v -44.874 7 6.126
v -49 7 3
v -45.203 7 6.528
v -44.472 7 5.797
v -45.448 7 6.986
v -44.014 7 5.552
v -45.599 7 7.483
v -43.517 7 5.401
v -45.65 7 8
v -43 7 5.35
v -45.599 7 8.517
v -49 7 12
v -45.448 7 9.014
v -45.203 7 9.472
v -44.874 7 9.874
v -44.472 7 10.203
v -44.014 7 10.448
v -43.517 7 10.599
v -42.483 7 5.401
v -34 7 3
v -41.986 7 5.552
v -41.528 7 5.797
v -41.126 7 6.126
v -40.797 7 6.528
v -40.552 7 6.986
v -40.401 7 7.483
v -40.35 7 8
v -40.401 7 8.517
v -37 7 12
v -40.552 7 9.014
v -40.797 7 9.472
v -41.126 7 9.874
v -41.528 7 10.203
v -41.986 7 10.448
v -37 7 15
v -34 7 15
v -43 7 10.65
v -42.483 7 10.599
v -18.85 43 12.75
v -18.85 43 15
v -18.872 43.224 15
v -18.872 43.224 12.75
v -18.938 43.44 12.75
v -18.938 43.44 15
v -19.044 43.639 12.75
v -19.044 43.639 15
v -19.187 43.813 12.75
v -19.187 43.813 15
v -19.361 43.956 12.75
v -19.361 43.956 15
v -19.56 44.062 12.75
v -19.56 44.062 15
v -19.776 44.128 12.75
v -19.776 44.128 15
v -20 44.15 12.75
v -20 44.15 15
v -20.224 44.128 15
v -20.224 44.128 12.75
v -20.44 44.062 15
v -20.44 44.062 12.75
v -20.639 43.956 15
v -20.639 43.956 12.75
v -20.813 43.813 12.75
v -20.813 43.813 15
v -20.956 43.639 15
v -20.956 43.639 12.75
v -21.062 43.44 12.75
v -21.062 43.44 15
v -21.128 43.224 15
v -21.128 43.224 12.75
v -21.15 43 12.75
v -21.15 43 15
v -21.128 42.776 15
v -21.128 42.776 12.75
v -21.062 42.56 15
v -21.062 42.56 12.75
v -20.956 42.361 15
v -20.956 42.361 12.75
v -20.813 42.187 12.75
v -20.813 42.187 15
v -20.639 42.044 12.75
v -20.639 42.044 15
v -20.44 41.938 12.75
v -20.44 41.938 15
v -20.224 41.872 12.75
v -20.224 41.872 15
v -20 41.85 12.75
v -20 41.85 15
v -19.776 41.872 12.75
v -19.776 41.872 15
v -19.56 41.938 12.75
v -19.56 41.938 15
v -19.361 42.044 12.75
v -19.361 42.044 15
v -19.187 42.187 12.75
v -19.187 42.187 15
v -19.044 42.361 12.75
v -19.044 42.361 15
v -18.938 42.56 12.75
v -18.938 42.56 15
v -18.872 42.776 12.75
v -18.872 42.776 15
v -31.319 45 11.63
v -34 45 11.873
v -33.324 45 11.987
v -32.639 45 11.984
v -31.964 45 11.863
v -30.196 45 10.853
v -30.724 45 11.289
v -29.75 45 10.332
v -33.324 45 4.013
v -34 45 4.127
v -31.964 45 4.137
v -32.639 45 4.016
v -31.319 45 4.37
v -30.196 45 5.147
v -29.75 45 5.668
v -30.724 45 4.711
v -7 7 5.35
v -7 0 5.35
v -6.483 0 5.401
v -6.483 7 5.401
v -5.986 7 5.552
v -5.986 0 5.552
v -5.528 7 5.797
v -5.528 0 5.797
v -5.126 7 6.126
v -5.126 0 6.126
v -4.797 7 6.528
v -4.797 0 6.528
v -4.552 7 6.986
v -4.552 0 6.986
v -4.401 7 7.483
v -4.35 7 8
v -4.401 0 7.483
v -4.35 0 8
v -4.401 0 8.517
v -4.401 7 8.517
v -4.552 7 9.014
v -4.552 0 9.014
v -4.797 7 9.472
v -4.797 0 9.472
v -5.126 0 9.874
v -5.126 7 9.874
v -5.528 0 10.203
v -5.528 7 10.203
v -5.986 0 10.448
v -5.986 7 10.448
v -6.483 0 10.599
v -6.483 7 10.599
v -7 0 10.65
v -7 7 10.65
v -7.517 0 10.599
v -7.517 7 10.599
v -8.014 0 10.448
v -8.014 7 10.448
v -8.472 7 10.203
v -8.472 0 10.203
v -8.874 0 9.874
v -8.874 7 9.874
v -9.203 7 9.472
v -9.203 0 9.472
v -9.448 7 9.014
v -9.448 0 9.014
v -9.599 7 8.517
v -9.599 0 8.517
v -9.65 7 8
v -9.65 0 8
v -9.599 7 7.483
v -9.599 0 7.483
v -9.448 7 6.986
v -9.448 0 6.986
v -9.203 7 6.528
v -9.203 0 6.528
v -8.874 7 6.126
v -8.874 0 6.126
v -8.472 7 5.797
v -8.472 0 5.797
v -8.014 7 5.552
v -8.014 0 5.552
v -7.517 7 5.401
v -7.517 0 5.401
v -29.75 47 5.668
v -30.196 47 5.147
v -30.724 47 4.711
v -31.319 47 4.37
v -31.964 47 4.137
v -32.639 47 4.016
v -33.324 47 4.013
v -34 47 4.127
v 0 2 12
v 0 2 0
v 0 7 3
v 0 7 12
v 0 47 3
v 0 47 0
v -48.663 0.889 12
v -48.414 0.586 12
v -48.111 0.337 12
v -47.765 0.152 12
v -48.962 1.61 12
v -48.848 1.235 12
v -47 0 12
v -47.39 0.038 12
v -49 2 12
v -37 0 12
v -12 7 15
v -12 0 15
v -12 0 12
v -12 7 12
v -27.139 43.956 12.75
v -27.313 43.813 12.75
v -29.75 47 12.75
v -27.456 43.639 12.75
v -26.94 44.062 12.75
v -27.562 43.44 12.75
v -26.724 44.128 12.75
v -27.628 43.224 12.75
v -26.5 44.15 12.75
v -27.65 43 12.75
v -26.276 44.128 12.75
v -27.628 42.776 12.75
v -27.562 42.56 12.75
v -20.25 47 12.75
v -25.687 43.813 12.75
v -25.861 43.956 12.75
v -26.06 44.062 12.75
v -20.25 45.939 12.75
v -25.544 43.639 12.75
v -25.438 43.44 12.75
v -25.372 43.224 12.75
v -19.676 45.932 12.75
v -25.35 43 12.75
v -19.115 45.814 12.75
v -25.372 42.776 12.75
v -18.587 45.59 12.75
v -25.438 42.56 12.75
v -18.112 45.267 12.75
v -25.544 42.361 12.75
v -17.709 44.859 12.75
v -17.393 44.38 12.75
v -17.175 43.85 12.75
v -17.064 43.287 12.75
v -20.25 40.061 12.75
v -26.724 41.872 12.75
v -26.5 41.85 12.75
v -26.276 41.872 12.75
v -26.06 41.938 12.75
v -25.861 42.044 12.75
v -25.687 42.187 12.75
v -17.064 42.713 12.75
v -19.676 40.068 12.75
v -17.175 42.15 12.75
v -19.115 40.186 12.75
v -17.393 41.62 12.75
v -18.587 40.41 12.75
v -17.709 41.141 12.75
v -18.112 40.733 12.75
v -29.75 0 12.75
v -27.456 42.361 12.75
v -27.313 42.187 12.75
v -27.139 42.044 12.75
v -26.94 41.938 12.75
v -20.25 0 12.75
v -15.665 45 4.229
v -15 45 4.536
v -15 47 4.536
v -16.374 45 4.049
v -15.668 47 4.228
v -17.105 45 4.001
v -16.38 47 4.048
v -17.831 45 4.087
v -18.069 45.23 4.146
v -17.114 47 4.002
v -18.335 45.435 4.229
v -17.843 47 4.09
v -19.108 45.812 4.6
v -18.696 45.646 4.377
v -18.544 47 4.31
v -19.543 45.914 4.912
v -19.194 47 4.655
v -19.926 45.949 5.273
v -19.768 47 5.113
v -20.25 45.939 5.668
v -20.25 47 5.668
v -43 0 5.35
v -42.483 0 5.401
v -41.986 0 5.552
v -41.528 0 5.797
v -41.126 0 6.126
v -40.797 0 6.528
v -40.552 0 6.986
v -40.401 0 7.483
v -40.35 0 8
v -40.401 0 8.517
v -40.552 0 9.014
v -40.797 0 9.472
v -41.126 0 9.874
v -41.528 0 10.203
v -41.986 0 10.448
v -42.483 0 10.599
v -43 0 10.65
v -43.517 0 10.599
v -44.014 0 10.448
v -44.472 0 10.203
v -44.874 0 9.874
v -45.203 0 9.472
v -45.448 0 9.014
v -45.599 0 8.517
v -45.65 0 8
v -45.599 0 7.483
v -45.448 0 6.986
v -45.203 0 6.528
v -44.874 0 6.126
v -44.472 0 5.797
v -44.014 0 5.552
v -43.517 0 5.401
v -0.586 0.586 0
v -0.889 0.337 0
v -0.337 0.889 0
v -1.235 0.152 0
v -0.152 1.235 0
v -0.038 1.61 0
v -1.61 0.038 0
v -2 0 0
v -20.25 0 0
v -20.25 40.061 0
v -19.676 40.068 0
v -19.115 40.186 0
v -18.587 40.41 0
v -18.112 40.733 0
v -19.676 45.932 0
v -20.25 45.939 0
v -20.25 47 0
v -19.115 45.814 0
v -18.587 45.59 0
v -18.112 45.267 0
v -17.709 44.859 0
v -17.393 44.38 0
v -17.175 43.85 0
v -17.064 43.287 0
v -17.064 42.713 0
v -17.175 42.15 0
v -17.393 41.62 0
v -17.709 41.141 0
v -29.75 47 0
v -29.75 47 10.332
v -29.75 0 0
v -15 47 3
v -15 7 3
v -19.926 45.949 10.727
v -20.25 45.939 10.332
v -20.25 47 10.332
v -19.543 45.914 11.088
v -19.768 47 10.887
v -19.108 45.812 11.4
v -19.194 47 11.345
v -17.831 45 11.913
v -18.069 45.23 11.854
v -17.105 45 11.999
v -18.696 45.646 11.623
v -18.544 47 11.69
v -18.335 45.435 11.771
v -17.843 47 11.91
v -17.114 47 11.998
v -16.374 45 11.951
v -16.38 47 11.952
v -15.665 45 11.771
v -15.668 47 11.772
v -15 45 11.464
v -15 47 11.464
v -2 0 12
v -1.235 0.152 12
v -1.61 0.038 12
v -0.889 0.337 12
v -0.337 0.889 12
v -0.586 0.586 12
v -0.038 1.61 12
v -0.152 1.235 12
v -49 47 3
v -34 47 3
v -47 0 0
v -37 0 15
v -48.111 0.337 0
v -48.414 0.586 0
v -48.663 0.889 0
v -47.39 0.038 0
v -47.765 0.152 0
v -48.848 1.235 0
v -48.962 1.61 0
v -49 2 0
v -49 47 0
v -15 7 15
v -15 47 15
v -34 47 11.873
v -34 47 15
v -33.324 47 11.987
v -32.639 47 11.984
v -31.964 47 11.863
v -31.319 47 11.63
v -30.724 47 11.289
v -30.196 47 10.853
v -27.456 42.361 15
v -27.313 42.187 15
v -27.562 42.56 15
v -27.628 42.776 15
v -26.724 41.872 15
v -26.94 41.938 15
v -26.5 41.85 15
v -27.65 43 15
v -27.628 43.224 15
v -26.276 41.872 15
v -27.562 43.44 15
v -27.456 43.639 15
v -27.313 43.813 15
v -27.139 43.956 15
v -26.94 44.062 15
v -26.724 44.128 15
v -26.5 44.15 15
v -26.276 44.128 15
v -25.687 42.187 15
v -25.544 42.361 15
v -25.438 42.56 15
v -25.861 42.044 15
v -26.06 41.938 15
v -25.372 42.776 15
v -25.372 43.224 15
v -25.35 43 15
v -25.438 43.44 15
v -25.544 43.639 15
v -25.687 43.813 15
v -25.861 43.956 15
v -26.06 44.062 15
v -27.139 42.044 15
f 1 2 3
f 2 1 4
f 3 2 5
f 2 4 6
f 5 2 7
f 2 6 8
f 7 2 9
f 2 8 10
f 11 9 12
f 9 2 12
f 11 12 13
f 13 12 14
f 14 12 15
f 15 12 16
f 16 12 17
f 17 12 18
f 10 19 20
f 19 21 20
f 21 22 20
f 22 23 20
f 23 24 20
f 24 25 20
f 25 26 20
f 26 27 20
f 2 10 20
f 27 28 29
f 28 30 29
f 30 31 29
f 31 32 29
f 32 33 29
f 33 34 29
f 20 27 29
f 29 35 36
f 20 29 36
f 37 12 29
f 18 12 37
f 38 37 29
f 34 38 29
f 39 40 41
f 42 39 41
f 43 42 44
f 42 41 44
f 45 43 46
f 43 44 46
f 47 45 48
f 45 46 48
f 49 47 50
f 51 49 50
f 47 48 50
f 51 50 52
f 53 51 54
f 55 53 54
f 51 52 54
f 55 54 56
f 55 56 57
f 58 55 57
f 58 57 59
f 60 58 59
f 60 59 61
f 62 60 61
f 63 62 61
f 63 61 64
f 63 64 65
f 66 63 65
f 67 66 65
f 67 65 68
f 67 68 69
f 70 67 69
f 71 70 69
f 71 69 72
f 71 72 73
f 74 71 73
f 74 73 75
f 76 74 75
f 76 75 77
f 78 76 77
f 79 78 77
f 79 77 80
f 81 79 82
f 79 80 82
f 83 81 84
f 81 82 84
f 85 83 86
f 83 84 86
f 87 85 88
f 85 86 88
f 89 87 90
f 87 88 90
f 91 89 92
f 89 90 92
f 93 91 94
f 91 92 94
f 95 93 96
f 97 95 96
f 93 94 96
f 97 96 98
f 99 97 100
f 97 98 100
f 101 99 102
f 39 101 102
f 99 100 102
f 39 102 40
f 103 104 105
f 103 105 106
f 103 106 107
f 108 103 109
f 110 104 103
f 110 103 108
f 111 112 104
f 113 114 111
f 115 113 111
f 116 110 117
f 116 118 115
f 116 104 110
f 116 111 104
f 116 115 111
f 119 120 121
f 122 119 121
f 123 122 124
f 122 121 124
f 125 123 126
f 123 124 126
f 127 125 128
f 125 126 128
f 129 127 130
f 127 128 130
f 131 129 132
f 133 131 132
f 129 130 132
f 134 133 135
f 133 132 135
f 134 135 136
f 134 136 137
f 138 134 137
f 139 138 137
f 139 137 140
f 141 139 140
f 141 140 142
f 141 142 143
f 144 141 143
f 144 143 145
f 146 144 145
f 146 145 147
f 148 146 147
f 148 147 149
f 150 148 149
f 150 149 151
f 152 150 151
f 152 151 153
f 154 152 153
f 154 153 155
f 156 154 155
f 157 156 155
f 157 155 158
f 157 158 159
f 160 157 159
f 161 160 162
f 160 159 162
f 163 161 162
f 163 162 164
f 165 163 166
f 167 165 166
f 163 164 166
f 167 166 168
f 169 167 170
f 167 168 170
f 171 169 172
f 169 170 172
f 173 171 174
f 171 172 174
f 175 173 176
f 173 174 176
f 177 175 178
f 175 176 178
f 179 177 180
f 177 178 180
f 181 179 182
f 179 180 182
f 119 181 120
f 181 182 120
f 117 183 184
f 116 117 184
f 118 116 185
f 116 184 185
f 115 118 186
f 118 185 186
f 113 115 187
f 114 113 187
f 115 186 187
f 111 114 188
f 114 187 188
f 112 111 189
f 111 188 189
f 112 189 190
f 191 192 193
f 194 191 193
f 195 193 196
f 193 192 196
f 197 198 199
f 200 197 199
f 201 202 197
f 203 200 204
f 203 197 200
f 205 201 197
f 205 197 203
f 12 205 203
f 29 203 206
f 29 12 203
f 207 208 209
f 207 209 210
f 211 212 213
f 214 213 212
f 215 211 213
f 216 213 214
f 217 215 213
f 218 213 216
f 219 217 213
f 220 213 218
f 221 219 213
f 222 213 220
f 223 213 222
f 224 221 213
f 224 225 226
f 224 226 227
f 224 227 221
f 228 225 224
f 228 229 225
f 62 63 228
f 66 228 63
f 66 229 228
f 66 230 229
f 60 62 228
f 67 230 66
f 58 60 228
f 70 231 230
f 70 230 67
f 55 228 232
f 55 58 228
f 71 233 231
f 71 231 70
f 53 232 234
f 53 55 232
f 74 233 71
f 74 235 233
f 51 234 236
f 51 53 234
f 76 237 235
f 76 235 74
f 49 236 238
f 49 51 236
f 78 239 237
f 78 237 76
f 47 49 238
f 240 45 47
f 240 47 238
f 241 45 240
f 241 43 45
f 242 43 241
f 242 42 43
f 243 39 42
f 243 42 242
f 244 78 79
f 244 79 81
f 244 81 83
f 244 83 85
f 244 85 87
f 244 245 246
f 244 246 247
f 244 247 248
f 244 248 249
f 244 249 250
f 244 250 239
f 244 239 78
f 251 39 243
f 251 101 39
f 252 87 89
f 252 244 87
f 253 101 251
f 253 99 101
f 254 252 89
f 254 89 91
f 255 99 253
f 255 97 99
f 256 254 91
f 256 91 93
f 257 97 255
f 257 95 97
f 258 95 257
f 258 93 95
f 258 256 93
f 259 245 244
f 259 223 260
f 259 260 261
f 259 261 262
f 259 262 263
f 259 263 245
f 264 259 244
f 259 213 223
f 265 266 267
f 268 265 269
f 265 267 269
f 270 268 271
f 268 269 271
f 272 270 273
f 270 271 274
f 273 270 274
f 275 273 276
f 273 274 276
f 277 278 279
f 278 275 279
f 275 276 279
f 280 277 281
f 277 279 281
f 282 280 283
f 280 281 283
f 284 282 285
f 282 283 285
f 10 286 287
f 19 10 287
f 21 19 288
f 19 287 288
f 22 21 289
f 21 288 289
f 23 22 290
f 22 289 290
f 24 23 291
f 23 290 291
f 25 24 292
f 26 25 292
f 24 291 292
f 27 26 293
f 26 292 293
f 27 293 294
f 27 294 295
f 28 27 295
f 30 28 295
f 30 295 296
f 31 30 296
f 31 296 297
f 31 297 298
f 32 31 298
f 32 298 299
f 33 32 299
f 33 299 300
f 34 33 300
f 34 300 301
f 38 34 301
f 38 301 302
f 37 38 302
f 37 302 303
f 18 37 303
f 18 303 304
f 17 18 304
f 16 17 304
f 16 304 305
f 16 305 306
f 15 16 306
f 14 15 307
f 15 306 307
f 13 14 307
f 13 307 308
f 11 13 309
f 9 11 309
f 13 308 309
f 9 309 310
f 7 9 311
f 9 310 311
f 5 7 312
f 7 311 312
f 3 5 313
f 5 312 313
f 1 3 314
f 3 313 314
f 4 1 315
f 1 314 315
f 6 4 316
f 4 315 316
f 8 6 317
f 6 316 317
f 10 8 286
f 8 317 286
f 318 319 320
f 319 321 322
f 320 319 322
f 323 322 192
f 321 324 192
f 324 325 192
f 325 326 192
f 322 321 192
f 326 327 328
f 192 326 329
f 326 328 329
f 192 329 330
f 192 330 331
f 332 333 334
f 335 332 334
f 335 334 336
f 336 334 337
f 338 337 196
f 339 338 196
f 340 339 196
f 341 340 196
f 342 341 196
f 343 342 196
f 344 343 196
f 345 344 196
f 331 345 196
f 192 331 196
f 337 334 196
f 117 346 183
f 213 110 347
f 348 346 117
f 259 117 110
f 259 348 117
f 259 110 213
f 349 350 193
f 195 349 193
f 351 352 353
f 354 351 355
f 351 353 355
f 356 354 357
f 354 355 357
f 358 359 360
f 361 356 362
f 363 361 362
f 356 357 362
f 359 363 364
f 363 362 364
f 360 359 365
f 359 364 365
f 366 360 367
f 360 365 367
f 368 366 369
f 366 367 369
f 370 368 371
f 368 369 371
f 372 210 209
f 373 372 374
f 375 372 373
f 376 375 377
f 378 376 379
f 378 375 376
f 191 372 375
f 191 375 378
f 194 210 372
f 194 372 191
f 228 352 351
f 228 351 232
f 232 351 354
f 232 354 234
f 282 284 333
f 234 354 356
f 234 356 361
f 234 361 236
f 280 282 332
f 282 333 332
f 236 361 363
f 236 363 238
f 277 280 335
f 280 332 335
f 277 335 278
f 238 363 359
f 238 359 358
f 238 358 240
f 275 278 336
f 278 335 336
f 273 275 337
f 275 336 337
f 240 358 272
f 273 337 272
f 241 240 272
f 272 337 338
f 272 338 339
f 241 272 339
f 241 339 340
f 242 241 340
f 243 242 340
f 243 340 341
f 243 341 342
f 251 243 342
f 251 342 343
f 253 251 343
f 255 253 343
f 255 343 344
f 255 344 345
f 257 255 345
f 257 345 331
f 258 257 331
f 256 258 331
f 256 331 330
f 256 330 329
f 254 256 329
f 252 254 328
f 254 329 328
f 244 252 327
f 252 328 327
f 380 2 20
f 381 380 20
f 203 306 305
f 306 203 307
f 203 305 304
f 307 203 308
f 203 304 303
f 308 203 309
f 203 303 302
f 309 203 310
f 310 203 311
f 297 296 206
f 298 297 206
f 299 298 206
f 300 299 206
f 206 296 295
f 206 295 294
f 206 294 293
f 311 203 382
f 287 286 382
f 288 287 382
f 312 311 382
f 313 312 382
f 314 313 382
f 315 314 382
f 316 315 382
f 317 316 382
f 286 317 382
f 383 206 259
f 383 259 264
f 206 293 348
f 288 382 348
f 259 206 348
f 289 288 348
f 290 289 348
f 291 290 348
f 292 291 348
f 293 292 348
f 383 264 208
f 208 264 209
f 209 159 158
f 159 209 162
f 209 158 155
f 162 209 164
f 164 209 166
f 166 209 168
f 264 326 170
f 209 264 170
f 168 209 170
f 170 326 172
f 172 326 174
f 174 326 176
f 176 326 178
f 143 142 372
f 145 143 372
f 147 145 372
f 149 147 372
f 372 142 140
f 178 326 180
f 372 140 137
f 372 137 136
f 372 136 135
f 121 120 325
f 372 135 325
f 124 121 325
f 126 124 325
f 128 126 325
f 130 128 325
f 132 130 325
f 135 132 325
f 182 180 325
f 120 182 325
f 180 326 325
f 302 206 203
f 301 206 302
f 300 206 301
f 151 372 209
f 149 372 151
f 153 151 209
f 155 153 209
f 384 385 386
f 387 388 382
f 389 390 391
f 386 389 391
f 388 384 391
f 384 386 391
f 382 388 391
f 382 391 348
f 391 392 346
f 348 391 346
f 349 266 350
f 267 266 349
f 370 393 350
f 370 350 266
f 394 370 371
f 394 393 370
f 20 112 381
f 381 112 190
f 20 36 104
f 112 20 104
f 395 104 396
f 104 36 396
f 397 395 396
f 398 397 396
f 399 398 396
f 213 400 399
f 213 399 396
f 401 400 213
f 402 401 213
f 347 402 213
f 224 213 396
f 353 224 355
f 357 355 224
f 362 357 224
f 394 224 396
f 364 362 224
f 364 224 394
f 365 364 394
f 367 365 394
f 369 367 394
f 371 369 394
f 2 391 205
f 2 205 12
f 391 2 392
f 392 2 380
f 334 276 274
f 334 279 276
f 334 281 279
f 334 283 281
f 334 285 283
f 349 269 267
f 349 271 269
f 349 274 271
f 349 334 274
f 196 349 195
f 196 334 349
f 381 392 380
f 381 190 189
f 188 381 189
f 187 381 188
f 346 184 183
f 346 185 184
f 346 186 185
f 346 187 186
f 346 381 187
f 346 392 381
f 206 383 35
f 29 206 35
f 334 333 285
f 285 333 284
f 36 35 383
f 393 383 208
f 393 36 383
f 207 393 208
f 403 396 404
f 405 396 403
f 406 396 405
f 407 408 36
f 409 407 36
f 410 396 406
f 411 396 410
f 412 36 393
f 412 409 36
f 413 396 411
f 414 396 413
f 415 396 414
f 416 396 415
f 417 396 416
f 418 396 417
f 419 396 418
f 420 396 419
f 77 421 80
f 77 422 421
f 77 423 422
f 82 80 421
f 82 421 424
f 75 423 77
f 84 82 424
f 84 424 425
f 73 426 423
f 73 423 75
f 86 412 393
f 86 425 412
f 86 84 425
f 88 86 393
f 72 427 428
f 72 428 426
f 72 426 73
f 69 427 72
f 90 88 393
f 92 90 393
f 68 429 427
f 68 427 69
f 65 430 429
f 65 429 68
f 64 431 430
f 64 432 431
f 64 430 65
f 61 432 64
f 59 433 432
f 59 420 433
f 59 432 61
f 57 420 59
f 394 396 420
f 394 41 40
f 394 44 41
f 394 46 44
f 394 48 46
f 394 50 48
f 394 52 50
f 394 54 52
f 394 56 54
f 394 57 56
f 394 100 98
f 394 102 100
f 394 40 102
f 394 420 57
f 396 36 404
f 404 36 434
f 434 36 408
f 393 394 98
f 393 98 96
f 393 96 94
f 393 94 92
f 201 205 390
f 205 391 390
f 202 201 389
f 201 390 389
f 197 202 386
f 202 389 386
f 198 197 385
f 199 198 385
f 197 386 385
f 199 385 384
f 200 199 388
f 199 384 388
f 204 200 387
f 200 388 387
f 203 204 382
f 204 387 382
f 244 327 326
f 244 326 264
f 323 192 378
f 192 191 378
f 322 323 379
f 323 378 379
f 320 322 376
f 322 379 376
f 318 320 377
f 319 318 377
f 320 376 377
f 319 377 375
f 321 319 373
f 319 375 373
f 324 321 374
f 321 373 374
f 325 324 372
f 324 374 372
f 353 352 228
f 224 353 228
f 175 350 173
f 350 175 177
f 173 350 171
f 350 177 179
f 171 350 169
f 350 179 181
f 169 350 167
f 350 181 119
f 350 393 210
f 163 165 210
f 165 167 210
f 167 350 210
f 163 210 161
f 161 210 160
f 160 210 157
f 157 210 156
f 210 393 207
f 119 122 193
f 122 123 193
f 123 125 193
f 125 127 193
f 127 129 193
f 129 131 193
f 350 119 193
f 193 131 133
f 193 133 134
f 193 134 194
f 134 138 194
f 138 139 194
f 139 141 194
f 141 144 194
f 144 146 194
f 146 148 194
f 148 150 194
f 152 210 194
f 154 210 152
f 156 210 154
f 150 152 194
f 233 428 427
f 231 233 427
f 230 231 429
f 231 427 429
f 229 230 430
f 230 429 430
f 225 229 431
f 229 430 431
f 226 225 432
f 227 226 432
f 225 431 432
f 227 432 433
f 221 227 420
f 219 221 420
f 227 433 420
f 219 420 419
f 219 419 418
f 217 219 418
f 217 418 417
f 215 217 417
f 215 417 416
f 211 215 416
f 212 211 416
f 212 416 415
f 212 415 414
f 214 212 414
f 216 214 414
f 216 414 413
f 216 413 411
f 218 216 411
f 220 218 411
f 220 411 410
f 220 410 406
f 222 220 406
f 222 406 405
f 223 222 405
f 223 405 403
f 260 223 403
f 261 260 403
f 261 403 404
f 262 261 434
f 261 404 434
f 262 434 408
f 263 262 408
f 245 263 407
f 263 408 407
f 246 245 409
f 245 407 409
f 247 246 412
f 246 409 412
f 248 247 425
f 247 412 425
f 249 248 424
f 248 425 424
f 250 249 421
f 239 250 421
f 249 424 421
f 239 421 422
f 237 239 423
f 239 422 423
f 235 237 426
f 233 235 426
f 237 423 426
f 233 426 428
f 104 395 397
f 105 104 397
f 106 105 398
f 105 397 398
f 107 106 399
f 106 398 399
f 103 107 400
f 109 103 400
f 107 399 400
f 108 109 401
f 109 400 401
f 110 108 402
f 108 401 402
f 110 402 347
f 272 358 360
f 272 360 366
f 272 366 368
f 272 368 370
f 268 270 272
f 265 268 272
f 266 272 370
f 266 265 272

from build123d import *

# Parameters (mm, degrees)
SKETCH_1_W           = 55
SKETCH_1_H           = 53
EXTRUDE_1_DEPTH      = 16
SKETCH_3_R           = 2.65
CUT_EXTRUDE_2_DEPTH  = 79.038452061
SKETCH_4_W           = 9.5
SKETCH_4_H           = 12.75
CUT_EXTRUDE_3_DEPTH  = 79.038452061
SKETCH_2_W           = 12
SKETCH_2_H           = 53
CUT_EXTRUDE_4_DEPTH  = 4
SKETCH_5_W           = 12
SKETCH_5_H           = 46
CUT_EXTRUDE_5_DEPTH  = 9
FILLET_1_R           = 2
CUT_EXTRUDE_6_DEPTH  = 79.038452061
FILLET_2_R           = 2
SKETCH_12_W          = 55.94515333
SKETCH_12_H          = 33.208956196
CUT_EXTRUDE_10_DEPTH = 6
SKETCH_13_R          = 1.15
CUT_EXTRUDE_11_DEPTH = 70.756720106
SKETCH_11_W          = 3
SKETCH_11_H          = 46
CUT_EXTRUDE_9_DEPTH  = 13
CUT_EXTRUDE_12_DEPTH = 1
SKETCH_15_R          = 3
SKETCH_15_R_2        = 2.95
CUT_EXTRUDE_13_DEPTH = 12.75
SKETCH_16_R          = 4
CUT_EXTRUDE_14_DEPTH = 2


with BuildPart() as part:
    # 草图1 → 凸台-拉伸1 (new body)
    with BuildSketch(Plane.XY):
        with Locations((-27.5, 26.5)):
            Rectangle(SKETCH_1_W, SKETCH_1_H)
    extrude(amount=EXTRUDE_1_DEPTH)

    # 草图3 → 切除-拉伸2 (cut, through all)
    with BuildSketch(Plane.XZ):
        with Locations(Location((-43, 8, 0), (0, 0, 270))):
            Circle(SKETCH_3_R)
        with Locations(Location((-7, 8, 0), (0, 0, 270))):
            Circle(SKETCH_3_R)
    extrude(amount=-CUT_EXTRUDE_2_DEPTH, mode=Mode.SUBTRACT)

    # 草图4 → 切除-拉伸3 (cut, through all)
    with BuildSketch(Plane.XZ):
        with Locations((-25, 6.375)):
            Rectangle(SKETCH_4_W, SKETCH_4_H)
    extrude(amount=-CUT_EXTRUDE_3_DEPTH, mode=Mode.SUBTRACT)

    # 草图2 → 切除-拉伸4 (cut)
    with BuildSketch(Plane.XY.offset(16)):
        with Locations((-43, 26.5)):
            Rectangle(SKETCH_2_W, SKETCH_2_H)
        with Locations((-6, 26.5)):
            Rectangle(SKETCH_2_W, SKETCH_2_H)
    extrude(amount=-CUT_EXTRUDE_4_DEPTH, mode=Mode.SUBTRACT)

    # 草图5 → 切除-拉伸5 (cut)
    with BuildSketch(Plane.XY.offset(12)):
        with Locations((-43, 30)):
            Rectangle(SKETCH_5_W, SKETCH_5_H)
        with Locations((-6, 30)):
            Rectangle(SKETCH_5_W, SKETCH_5_H)
    extrude(amount=-CUT_EXTRUDE_5_DEPTH, mode=Mode.SUBTRACT)

    # 圆角1
    fillet_1_edges = [part.edges().sort_by_distance(p)[0] for p in [
        (0, 0, 6),
        (0, 53, 1.5),
        (-55, 53, 8),
        (-55, 0, 8),
    ]]
    fillet(fillet_1_edges, radius=FILLET_1_R)

    # 草图6 → 切除-拉伸6 (cut, through all)
    with BuildSketch(Plane.XY.offset(16)):
        with BuildLine():
            Line((-49, 0), (-49, 53))
            Line((-49, 53), (-53, 53))
            ThreePointArc((-53, 53), (-54.414213562, 52.414213562), (-55, 51))
            Line((-55, 51), (-55, 2))
            ThreePointArc((-55, 2), (-54.414213562, 0.585786438), (-53, 0))
            Line((-53, 0), (-49, 0))
        make_face()
    extrude(amount=-CUT_EXTRUDE_6_DEPTH, mode=Mode.SUBTRACT)

    # 圆角2
    fillet_2_edges = [part.edges().sort_by_distance(p)[0] for p in [
        (-49, 53, 1.5),
        (-49, 0, 6),
    ]]
    fillet(fillet_2_edges, radius=FILLET_2_R)

    # 草图12 → 切除-拉伸10 (cut)
    with BuildSketch(Plane(origin=(0, 53, 0), x_dir=(1, 0, 0), z_dir=(0, 1, 0))):
        with Locations((-25.829443508, -5.558164986)):
            Rectangle(SKETCH_12_W, SKETCH_12_H)
    extrude(amount=-CUT_EXTRUDE_10_DEPTH, mode=Mode.SUBTRACT)

    # 草图13 → 切除-拉伸11 (cut, through all)
    with BuildSketch(Plane.XY.offset(16)):
        with Locations((-26.5, 43)):
            Circle(SKETCH_13_R)
        with Locations((-20, 43)):
            Circle(SKETCH_13_R)
    extrude(amount=-CUT_EXTRUDE_11_DEPTH, mode=Mode.SUBTRACT)

    # 草图11 → 切除-拉伸9 (cut)
    with BuildSketch(Plane.XY.offset(16)):
        with Locations((-35.5, 30)):
            Rectangle(SKETCH_11_W, SKETCH_11_H)
        with Locations((-13.5, 30)):
            Rectangle(SKETCH_11_W, SKETCH_11_H)
    extrude(amount=-CUT_EXTRUDE_9_DEPTH, mode=Mode.SUBTRACT)

    # 草图14 → 切除-拉伸12 (cut)
    with BuildSketch(Plane.XY.offset(16)):
        Polygon((-34, 47), (-34, 7), (-37, 7), (-37, 0), (-12, 0), (-12, 7), (-15, 7), (-15, 47), align=None)
    extrude(amount=-CUT_EXTRUDE_12_DEPTH, mode=Mode.SUBTRACT)

    # 草图15 → 切除-拉伸13 (cut)
    with BuildSketch(Plane(origin=(0, 0, 0), x_dir=(-1, 0, 0), z_dir=(0, 0, -1))):
        with Locations((26.5, 43)):
            Circle(SKETCH_15_R)
        with Locations((20, 43)):
            Circle(SKETCH_15_R_2)
    extrude(amount=-CUT_EXTRUDE_13_DEPTH, mode=Mode.SUBTRACT)

    # 草图16 → 切除-拉伸14 (cut)
    with BuildSketch(Plane(origin=(0, 47, 0), x_dir=(1, 0, 0), z_dir=(0, 1, 0))):
        with Locations((-17, -8)):
            Circle(SKETCH_16_R)
        with Locations((-33, -8)):
            Circle(SKETCH_16_R)
    extrude(amount=-CUT_EXTRUDE_14_DEPTH, mode=Mode.SUBTRACT)


solid = part.part
